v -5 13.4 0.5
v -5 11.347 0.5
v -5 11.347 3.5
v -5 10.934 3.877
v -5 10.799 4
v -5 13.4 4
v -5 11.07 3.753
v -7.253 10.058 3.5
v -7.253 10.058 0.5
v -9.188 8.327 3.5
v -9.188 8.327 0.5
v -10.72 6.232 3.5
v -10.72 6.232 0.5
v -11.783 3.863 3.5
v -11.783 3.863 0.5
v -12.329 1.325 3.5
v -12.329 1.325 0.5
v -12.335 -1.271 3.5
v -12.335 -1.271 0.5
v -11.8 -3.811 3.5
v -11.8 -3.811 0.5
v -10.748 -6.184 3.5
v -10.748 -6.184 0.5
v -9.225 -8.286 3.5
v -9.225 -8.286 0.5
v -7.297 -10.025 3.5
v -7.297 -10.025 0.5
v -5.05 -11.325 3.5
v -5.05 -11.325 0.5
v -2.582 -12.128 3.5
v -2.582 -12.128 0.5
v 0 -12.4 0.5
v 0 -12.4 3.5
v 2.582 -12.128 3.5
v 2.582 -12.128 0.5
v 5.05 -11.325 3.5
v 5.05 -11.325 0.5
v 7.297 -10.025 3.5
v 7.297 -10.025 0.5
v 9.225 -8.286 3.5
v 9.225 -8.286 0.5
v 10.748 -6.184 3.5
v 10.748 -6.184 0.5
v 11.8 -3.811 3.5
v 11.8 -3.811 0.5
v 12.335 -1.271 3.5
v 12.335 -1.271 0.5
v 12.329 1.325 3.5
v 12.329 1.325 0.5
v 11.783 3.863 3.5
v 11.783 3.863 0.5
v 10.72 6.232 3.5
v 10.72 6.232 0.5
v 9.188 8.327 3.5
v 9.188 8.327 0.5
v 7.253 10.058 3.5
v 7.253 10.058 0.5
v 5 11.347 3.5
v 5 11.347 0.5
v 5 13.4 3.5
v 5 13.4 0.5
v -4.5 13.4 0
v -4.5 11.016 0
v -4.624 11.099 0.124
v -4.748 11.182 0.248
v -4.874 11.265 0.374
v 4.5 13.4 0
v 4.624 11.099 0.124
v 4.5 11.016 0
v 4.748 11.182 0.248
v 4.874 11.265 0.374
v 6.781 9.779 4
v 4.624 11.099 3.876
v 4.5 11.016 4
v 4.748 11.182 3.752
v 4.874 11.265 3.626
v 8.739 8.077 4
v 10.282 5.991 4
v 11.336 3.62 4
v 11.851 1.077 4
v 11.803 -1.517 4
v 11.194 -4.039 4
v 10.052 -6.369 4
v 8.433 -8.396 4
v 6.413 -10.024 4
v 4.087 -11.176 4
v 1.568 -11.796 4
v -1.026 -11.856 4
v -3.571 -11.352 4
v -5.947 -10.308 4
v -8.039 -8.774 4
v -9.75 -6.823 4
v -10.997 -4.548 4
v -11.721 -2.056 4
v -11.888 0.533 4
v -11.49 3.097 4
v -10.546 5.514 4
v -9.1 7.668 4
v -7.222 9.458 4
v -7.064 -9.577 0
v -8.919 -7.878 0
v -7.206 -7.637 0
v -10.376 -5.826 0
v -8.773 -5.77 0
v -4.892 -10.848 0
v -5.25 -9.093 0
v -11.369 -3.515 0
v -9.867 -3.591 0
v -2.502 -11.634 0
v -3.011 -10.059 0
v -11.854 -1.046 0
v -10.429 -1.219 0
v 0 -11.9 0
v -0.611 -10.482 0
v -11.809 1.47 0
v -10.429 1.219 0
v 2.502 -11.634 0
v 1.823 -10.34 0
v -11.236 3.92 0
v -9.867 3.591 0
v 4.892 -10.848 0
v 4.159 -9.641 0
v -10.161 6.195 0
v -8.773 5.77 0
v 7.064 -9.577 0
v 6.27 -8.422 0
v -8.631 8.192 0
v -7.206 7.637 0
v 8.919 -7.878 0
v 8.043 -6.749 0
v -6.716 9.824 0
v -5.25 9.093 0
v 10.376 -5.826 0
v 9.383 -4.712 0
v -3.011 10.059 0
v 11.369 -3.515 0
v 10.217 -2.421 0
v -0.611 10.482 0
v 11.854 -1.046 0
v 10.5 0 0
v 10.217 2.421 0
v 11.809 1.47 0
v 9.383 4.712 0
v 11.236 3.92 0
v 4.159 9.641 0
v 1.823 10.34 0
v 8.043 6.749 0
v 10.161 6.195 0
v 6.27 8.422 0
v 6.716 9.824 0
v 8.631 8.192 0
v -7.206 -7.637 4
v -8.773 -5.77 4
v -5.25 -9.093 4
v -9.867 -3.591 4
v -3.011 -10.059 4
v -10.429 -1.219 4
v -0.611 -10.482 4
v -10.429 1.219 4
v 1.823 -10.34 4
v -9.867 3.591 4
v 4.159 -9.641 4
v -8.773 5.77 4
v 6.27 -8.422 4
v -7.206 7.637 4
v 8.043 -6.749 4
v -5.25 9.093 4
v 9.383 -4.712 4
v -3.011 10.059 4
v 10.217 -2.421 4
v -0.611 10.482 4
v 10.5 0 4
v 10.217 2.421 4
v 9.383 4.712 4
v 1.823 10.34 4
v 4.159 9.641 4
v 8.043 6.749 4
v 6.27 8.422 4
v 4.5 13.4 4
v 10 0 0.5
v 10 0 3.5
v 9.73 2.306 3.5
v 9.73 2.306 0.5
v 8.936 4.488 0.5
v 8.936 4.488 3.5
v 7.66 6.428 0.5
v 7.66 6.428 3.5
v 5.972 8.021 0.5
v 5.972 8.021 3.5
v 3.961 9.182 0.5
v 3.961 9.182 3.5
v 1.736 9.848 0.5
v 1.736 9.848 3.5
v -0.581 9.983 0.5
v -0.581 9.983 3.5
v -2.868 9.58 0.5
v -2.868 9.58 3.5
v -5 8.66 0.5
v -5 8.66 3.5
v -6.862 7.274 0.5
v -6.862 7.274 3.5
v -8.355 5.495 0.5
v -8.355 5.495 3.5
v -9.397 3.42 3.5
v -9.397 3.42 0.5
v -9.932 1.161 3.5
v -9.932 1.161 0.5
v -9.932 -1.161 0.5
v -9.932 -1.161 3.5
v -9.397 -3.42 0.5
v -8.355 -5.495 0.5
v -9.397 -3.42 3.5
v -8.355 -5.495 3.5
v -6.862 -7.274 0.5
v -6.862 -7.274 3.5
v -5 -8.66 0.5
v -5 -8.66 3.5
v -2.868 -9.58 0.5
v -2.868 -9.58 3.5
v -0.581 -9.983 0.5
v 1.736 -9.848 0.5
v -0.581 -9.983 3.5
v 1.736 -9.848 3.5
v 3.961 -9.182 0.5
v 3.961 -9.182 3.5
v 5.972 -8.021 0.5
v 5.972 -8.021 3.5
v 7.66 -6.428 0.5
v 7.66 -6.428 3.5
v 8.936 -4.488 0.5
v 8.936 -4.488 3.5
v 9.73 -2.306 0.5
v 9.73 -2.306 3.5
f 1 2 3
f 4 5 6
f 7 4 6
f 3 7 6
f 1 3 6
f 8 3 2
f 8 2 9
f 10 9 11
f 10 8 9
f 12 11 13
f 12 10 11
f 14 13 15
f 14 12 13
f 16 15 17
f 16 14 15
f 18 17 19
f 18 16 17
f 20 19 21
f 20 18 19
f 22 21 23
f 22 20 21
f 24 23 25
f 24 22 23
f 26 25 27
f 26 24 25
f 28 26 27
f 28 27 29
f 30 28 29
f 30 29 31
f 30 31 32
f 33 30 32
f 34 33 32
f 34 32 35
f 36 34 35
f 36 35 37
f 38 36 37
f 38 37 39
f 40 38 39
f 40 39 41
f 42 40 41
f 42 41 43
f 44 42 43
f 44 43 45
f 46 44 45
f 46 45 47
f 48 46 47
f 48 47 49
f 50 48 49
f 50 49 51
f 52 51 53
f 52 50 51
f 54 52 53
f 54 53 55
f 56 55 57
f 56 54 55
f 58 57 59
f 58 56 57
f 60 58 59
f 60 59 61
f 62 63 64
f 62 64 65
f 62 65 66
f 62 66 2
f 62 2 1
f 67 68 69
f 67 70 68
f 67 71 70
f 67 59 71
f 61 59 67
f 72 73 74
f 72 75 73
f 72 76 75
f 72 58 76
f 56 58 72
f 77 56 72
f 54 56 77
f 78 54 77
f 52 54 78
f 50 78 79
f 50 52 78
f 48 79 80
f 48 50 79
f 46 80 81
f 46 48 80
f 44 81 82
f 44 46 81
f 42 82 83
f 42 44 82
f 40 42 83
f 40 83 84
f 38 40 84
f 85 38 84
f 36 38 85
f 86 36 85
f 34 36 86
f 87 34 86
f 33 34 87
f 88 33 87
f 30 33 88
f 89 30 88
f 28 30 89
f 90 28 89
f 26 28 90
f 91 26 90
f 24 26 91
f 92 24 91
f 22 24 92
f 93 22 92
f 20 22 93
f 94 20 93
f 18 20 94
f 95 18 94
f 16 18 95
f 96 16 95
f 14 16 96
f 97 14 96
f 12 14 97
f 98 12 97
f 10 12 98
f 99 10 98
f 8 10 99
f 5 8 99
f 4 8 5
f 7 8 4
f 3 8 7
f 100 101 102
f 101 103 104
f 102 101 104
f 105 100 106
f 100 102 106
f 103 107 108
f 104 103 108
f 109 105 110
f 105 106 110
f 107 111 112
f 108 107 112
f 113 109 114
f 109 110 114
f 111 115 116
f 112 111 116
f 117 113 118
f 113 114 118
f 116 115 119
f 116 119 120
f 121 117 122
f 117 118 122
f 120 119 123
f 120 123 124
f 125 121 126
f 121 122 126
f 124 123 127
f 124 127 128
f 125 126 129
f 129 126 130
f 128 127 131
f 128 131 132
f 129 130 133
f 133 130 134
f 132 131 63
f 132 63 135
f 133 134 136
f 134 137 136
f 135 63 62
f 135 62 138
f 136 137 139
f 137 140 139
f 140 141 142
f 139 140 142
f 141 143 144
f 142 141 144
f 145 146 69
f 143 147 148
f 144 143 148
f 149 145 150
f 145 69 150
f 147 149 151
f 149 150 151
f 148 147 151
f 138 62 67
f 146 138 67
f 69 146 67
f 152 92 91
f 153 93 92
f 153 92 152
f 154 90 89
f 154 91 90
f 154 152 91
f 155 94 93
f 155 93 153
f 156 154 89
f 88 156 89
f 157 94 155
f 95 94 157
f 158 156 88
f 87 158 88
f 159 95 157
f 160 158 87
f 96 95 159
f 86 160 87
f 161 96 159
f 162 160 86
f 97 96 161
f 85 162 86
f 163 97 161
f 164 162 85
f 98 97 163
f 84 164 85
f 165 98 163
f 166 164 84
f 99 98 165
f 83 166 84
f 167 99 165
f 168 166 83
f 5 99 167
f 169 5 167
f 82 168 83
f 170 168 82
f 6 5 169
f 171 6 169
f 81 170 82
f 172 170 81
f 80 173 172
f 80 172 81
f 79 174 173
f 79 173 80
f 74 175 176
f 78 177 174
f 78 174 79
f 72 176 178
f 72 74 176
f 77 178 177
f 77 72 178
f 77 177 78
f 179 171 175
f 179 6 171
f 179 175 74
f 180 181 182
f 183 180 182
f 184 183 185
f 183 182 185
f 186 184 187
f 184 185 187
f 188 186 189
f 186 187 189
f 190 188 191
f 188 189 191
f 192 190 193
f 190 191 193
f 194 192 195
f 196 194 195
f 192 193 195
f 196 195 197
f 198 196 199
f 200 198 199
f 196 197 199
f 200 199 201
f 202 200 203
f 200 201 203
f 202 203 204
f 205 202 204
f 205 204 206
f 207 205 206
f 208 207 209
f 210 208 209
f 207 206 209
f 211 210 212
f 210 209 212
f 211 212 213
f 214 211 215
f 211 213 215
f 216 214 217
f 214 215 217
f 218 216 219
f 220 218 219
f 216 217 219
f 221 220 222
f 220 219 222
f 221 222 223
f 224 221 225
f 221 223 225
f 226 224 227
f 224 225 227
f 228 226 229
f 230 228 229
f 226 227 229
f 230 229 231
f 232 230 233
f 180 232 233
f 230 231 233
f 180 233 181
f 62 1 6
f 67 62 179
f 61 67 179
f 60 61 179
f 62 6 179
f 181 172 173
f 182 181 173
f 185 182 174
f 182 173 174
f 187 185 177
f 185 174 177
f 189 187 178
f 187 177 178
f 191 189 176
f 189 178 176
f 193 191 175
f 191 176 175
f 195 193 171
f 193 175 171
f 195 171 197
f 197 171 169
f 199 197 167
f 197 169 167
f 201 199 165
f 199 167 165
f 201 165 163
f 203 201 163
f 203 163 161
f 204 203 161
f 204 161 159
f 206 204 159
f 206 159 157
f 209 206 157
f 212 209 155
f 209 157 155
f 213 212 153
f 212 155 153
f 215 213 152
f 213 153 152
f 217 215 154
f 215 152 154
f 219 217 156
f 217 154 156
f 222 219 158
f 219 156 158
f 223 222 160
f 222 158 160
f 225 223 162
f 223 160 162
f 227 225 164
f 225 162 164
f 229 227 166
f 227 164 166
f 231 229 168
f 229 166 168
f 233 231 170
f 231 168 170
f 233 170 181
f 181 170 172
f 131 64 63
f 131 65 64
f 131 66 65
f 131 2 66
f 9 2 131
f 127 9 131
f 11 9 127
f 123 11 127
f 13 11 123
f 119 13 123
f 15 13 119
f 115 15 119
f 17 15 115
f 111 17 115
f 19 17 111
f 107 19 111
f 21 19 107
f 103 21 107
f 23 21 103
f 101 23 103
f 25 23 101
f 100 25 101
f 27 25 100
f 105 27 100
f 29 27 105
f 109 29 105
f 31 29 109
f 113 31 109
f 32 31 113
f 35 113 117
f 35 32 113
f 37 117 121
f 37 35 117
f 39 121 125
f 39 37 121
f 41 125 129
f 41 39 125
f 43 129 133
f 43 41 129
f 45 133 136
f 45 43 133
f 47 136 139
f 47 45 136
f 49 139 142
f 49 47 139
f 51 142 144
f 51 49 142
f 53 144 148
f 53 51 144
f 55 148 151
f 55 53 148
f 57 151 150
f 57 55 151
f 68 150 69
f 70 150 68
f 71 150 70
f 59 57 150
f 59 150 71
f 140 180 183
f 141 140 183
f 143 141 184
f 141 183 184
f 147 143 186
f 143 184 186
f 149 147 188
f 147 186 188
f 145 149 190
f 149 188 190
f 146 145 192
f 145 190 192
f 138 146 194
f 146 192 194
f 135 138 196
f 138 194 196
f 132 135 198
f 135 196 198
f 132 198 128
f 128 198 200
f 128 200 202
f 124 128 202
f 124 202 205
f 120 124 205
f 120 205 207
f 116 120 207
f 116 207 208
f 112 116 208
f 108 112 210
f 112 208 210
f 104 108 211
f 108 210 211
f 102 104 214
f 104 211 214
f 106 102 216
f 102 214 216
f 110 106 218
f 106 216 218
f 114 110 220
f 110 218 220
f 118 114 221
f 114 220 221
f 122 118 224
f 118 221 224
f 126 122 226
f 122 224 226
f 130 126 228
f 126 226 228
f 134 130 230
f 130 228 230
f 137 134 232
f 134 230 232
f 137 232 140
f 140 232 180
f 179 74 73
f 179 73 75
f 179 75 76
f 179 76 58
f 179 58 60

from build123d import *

# Parameters (mm, degrees)
F0_W     = 2.4
F0_H     = 4
F2_W     = 10
F2_H     = 2.052753638
F3_DEPTH = 4
F4_SIZE  = 0.5


with BuildPart() as f1:
    # F0 (on Front) → F1 (revolve)
    with BuildSketch(Plane.XZ):
        with Locations((11.2, 2)):
            Rectangle(F0_W, F0_H)
    revolve(axis=Axis((0, 0, 5.2245724946), (0, 0, 1)))

    # F2 (on face) → F3 (join, through all)
    with BuildSketch(Plane.XY.offset(4)):
        with Locations((0, 12.373623181)):
            Rectangle(F2_W, F2_H)
    extrude(amount=-F3_DEPTH)

    # F4
    f4_edges = [f1.edges().sort_by_distance(p)[0] for p in [
        (0, -12.4, 4),
        (5, 12.373623, 4),
        (0, -12.4, 0),
        (5, 12.373623, 0),
        (-5, 12.373623, 0),
        (-10, 0, 4),
        (-10, 0, 0),
    ]]
    chamfer(f4_edges, length=F4_SIZE)


solid = f1.part
